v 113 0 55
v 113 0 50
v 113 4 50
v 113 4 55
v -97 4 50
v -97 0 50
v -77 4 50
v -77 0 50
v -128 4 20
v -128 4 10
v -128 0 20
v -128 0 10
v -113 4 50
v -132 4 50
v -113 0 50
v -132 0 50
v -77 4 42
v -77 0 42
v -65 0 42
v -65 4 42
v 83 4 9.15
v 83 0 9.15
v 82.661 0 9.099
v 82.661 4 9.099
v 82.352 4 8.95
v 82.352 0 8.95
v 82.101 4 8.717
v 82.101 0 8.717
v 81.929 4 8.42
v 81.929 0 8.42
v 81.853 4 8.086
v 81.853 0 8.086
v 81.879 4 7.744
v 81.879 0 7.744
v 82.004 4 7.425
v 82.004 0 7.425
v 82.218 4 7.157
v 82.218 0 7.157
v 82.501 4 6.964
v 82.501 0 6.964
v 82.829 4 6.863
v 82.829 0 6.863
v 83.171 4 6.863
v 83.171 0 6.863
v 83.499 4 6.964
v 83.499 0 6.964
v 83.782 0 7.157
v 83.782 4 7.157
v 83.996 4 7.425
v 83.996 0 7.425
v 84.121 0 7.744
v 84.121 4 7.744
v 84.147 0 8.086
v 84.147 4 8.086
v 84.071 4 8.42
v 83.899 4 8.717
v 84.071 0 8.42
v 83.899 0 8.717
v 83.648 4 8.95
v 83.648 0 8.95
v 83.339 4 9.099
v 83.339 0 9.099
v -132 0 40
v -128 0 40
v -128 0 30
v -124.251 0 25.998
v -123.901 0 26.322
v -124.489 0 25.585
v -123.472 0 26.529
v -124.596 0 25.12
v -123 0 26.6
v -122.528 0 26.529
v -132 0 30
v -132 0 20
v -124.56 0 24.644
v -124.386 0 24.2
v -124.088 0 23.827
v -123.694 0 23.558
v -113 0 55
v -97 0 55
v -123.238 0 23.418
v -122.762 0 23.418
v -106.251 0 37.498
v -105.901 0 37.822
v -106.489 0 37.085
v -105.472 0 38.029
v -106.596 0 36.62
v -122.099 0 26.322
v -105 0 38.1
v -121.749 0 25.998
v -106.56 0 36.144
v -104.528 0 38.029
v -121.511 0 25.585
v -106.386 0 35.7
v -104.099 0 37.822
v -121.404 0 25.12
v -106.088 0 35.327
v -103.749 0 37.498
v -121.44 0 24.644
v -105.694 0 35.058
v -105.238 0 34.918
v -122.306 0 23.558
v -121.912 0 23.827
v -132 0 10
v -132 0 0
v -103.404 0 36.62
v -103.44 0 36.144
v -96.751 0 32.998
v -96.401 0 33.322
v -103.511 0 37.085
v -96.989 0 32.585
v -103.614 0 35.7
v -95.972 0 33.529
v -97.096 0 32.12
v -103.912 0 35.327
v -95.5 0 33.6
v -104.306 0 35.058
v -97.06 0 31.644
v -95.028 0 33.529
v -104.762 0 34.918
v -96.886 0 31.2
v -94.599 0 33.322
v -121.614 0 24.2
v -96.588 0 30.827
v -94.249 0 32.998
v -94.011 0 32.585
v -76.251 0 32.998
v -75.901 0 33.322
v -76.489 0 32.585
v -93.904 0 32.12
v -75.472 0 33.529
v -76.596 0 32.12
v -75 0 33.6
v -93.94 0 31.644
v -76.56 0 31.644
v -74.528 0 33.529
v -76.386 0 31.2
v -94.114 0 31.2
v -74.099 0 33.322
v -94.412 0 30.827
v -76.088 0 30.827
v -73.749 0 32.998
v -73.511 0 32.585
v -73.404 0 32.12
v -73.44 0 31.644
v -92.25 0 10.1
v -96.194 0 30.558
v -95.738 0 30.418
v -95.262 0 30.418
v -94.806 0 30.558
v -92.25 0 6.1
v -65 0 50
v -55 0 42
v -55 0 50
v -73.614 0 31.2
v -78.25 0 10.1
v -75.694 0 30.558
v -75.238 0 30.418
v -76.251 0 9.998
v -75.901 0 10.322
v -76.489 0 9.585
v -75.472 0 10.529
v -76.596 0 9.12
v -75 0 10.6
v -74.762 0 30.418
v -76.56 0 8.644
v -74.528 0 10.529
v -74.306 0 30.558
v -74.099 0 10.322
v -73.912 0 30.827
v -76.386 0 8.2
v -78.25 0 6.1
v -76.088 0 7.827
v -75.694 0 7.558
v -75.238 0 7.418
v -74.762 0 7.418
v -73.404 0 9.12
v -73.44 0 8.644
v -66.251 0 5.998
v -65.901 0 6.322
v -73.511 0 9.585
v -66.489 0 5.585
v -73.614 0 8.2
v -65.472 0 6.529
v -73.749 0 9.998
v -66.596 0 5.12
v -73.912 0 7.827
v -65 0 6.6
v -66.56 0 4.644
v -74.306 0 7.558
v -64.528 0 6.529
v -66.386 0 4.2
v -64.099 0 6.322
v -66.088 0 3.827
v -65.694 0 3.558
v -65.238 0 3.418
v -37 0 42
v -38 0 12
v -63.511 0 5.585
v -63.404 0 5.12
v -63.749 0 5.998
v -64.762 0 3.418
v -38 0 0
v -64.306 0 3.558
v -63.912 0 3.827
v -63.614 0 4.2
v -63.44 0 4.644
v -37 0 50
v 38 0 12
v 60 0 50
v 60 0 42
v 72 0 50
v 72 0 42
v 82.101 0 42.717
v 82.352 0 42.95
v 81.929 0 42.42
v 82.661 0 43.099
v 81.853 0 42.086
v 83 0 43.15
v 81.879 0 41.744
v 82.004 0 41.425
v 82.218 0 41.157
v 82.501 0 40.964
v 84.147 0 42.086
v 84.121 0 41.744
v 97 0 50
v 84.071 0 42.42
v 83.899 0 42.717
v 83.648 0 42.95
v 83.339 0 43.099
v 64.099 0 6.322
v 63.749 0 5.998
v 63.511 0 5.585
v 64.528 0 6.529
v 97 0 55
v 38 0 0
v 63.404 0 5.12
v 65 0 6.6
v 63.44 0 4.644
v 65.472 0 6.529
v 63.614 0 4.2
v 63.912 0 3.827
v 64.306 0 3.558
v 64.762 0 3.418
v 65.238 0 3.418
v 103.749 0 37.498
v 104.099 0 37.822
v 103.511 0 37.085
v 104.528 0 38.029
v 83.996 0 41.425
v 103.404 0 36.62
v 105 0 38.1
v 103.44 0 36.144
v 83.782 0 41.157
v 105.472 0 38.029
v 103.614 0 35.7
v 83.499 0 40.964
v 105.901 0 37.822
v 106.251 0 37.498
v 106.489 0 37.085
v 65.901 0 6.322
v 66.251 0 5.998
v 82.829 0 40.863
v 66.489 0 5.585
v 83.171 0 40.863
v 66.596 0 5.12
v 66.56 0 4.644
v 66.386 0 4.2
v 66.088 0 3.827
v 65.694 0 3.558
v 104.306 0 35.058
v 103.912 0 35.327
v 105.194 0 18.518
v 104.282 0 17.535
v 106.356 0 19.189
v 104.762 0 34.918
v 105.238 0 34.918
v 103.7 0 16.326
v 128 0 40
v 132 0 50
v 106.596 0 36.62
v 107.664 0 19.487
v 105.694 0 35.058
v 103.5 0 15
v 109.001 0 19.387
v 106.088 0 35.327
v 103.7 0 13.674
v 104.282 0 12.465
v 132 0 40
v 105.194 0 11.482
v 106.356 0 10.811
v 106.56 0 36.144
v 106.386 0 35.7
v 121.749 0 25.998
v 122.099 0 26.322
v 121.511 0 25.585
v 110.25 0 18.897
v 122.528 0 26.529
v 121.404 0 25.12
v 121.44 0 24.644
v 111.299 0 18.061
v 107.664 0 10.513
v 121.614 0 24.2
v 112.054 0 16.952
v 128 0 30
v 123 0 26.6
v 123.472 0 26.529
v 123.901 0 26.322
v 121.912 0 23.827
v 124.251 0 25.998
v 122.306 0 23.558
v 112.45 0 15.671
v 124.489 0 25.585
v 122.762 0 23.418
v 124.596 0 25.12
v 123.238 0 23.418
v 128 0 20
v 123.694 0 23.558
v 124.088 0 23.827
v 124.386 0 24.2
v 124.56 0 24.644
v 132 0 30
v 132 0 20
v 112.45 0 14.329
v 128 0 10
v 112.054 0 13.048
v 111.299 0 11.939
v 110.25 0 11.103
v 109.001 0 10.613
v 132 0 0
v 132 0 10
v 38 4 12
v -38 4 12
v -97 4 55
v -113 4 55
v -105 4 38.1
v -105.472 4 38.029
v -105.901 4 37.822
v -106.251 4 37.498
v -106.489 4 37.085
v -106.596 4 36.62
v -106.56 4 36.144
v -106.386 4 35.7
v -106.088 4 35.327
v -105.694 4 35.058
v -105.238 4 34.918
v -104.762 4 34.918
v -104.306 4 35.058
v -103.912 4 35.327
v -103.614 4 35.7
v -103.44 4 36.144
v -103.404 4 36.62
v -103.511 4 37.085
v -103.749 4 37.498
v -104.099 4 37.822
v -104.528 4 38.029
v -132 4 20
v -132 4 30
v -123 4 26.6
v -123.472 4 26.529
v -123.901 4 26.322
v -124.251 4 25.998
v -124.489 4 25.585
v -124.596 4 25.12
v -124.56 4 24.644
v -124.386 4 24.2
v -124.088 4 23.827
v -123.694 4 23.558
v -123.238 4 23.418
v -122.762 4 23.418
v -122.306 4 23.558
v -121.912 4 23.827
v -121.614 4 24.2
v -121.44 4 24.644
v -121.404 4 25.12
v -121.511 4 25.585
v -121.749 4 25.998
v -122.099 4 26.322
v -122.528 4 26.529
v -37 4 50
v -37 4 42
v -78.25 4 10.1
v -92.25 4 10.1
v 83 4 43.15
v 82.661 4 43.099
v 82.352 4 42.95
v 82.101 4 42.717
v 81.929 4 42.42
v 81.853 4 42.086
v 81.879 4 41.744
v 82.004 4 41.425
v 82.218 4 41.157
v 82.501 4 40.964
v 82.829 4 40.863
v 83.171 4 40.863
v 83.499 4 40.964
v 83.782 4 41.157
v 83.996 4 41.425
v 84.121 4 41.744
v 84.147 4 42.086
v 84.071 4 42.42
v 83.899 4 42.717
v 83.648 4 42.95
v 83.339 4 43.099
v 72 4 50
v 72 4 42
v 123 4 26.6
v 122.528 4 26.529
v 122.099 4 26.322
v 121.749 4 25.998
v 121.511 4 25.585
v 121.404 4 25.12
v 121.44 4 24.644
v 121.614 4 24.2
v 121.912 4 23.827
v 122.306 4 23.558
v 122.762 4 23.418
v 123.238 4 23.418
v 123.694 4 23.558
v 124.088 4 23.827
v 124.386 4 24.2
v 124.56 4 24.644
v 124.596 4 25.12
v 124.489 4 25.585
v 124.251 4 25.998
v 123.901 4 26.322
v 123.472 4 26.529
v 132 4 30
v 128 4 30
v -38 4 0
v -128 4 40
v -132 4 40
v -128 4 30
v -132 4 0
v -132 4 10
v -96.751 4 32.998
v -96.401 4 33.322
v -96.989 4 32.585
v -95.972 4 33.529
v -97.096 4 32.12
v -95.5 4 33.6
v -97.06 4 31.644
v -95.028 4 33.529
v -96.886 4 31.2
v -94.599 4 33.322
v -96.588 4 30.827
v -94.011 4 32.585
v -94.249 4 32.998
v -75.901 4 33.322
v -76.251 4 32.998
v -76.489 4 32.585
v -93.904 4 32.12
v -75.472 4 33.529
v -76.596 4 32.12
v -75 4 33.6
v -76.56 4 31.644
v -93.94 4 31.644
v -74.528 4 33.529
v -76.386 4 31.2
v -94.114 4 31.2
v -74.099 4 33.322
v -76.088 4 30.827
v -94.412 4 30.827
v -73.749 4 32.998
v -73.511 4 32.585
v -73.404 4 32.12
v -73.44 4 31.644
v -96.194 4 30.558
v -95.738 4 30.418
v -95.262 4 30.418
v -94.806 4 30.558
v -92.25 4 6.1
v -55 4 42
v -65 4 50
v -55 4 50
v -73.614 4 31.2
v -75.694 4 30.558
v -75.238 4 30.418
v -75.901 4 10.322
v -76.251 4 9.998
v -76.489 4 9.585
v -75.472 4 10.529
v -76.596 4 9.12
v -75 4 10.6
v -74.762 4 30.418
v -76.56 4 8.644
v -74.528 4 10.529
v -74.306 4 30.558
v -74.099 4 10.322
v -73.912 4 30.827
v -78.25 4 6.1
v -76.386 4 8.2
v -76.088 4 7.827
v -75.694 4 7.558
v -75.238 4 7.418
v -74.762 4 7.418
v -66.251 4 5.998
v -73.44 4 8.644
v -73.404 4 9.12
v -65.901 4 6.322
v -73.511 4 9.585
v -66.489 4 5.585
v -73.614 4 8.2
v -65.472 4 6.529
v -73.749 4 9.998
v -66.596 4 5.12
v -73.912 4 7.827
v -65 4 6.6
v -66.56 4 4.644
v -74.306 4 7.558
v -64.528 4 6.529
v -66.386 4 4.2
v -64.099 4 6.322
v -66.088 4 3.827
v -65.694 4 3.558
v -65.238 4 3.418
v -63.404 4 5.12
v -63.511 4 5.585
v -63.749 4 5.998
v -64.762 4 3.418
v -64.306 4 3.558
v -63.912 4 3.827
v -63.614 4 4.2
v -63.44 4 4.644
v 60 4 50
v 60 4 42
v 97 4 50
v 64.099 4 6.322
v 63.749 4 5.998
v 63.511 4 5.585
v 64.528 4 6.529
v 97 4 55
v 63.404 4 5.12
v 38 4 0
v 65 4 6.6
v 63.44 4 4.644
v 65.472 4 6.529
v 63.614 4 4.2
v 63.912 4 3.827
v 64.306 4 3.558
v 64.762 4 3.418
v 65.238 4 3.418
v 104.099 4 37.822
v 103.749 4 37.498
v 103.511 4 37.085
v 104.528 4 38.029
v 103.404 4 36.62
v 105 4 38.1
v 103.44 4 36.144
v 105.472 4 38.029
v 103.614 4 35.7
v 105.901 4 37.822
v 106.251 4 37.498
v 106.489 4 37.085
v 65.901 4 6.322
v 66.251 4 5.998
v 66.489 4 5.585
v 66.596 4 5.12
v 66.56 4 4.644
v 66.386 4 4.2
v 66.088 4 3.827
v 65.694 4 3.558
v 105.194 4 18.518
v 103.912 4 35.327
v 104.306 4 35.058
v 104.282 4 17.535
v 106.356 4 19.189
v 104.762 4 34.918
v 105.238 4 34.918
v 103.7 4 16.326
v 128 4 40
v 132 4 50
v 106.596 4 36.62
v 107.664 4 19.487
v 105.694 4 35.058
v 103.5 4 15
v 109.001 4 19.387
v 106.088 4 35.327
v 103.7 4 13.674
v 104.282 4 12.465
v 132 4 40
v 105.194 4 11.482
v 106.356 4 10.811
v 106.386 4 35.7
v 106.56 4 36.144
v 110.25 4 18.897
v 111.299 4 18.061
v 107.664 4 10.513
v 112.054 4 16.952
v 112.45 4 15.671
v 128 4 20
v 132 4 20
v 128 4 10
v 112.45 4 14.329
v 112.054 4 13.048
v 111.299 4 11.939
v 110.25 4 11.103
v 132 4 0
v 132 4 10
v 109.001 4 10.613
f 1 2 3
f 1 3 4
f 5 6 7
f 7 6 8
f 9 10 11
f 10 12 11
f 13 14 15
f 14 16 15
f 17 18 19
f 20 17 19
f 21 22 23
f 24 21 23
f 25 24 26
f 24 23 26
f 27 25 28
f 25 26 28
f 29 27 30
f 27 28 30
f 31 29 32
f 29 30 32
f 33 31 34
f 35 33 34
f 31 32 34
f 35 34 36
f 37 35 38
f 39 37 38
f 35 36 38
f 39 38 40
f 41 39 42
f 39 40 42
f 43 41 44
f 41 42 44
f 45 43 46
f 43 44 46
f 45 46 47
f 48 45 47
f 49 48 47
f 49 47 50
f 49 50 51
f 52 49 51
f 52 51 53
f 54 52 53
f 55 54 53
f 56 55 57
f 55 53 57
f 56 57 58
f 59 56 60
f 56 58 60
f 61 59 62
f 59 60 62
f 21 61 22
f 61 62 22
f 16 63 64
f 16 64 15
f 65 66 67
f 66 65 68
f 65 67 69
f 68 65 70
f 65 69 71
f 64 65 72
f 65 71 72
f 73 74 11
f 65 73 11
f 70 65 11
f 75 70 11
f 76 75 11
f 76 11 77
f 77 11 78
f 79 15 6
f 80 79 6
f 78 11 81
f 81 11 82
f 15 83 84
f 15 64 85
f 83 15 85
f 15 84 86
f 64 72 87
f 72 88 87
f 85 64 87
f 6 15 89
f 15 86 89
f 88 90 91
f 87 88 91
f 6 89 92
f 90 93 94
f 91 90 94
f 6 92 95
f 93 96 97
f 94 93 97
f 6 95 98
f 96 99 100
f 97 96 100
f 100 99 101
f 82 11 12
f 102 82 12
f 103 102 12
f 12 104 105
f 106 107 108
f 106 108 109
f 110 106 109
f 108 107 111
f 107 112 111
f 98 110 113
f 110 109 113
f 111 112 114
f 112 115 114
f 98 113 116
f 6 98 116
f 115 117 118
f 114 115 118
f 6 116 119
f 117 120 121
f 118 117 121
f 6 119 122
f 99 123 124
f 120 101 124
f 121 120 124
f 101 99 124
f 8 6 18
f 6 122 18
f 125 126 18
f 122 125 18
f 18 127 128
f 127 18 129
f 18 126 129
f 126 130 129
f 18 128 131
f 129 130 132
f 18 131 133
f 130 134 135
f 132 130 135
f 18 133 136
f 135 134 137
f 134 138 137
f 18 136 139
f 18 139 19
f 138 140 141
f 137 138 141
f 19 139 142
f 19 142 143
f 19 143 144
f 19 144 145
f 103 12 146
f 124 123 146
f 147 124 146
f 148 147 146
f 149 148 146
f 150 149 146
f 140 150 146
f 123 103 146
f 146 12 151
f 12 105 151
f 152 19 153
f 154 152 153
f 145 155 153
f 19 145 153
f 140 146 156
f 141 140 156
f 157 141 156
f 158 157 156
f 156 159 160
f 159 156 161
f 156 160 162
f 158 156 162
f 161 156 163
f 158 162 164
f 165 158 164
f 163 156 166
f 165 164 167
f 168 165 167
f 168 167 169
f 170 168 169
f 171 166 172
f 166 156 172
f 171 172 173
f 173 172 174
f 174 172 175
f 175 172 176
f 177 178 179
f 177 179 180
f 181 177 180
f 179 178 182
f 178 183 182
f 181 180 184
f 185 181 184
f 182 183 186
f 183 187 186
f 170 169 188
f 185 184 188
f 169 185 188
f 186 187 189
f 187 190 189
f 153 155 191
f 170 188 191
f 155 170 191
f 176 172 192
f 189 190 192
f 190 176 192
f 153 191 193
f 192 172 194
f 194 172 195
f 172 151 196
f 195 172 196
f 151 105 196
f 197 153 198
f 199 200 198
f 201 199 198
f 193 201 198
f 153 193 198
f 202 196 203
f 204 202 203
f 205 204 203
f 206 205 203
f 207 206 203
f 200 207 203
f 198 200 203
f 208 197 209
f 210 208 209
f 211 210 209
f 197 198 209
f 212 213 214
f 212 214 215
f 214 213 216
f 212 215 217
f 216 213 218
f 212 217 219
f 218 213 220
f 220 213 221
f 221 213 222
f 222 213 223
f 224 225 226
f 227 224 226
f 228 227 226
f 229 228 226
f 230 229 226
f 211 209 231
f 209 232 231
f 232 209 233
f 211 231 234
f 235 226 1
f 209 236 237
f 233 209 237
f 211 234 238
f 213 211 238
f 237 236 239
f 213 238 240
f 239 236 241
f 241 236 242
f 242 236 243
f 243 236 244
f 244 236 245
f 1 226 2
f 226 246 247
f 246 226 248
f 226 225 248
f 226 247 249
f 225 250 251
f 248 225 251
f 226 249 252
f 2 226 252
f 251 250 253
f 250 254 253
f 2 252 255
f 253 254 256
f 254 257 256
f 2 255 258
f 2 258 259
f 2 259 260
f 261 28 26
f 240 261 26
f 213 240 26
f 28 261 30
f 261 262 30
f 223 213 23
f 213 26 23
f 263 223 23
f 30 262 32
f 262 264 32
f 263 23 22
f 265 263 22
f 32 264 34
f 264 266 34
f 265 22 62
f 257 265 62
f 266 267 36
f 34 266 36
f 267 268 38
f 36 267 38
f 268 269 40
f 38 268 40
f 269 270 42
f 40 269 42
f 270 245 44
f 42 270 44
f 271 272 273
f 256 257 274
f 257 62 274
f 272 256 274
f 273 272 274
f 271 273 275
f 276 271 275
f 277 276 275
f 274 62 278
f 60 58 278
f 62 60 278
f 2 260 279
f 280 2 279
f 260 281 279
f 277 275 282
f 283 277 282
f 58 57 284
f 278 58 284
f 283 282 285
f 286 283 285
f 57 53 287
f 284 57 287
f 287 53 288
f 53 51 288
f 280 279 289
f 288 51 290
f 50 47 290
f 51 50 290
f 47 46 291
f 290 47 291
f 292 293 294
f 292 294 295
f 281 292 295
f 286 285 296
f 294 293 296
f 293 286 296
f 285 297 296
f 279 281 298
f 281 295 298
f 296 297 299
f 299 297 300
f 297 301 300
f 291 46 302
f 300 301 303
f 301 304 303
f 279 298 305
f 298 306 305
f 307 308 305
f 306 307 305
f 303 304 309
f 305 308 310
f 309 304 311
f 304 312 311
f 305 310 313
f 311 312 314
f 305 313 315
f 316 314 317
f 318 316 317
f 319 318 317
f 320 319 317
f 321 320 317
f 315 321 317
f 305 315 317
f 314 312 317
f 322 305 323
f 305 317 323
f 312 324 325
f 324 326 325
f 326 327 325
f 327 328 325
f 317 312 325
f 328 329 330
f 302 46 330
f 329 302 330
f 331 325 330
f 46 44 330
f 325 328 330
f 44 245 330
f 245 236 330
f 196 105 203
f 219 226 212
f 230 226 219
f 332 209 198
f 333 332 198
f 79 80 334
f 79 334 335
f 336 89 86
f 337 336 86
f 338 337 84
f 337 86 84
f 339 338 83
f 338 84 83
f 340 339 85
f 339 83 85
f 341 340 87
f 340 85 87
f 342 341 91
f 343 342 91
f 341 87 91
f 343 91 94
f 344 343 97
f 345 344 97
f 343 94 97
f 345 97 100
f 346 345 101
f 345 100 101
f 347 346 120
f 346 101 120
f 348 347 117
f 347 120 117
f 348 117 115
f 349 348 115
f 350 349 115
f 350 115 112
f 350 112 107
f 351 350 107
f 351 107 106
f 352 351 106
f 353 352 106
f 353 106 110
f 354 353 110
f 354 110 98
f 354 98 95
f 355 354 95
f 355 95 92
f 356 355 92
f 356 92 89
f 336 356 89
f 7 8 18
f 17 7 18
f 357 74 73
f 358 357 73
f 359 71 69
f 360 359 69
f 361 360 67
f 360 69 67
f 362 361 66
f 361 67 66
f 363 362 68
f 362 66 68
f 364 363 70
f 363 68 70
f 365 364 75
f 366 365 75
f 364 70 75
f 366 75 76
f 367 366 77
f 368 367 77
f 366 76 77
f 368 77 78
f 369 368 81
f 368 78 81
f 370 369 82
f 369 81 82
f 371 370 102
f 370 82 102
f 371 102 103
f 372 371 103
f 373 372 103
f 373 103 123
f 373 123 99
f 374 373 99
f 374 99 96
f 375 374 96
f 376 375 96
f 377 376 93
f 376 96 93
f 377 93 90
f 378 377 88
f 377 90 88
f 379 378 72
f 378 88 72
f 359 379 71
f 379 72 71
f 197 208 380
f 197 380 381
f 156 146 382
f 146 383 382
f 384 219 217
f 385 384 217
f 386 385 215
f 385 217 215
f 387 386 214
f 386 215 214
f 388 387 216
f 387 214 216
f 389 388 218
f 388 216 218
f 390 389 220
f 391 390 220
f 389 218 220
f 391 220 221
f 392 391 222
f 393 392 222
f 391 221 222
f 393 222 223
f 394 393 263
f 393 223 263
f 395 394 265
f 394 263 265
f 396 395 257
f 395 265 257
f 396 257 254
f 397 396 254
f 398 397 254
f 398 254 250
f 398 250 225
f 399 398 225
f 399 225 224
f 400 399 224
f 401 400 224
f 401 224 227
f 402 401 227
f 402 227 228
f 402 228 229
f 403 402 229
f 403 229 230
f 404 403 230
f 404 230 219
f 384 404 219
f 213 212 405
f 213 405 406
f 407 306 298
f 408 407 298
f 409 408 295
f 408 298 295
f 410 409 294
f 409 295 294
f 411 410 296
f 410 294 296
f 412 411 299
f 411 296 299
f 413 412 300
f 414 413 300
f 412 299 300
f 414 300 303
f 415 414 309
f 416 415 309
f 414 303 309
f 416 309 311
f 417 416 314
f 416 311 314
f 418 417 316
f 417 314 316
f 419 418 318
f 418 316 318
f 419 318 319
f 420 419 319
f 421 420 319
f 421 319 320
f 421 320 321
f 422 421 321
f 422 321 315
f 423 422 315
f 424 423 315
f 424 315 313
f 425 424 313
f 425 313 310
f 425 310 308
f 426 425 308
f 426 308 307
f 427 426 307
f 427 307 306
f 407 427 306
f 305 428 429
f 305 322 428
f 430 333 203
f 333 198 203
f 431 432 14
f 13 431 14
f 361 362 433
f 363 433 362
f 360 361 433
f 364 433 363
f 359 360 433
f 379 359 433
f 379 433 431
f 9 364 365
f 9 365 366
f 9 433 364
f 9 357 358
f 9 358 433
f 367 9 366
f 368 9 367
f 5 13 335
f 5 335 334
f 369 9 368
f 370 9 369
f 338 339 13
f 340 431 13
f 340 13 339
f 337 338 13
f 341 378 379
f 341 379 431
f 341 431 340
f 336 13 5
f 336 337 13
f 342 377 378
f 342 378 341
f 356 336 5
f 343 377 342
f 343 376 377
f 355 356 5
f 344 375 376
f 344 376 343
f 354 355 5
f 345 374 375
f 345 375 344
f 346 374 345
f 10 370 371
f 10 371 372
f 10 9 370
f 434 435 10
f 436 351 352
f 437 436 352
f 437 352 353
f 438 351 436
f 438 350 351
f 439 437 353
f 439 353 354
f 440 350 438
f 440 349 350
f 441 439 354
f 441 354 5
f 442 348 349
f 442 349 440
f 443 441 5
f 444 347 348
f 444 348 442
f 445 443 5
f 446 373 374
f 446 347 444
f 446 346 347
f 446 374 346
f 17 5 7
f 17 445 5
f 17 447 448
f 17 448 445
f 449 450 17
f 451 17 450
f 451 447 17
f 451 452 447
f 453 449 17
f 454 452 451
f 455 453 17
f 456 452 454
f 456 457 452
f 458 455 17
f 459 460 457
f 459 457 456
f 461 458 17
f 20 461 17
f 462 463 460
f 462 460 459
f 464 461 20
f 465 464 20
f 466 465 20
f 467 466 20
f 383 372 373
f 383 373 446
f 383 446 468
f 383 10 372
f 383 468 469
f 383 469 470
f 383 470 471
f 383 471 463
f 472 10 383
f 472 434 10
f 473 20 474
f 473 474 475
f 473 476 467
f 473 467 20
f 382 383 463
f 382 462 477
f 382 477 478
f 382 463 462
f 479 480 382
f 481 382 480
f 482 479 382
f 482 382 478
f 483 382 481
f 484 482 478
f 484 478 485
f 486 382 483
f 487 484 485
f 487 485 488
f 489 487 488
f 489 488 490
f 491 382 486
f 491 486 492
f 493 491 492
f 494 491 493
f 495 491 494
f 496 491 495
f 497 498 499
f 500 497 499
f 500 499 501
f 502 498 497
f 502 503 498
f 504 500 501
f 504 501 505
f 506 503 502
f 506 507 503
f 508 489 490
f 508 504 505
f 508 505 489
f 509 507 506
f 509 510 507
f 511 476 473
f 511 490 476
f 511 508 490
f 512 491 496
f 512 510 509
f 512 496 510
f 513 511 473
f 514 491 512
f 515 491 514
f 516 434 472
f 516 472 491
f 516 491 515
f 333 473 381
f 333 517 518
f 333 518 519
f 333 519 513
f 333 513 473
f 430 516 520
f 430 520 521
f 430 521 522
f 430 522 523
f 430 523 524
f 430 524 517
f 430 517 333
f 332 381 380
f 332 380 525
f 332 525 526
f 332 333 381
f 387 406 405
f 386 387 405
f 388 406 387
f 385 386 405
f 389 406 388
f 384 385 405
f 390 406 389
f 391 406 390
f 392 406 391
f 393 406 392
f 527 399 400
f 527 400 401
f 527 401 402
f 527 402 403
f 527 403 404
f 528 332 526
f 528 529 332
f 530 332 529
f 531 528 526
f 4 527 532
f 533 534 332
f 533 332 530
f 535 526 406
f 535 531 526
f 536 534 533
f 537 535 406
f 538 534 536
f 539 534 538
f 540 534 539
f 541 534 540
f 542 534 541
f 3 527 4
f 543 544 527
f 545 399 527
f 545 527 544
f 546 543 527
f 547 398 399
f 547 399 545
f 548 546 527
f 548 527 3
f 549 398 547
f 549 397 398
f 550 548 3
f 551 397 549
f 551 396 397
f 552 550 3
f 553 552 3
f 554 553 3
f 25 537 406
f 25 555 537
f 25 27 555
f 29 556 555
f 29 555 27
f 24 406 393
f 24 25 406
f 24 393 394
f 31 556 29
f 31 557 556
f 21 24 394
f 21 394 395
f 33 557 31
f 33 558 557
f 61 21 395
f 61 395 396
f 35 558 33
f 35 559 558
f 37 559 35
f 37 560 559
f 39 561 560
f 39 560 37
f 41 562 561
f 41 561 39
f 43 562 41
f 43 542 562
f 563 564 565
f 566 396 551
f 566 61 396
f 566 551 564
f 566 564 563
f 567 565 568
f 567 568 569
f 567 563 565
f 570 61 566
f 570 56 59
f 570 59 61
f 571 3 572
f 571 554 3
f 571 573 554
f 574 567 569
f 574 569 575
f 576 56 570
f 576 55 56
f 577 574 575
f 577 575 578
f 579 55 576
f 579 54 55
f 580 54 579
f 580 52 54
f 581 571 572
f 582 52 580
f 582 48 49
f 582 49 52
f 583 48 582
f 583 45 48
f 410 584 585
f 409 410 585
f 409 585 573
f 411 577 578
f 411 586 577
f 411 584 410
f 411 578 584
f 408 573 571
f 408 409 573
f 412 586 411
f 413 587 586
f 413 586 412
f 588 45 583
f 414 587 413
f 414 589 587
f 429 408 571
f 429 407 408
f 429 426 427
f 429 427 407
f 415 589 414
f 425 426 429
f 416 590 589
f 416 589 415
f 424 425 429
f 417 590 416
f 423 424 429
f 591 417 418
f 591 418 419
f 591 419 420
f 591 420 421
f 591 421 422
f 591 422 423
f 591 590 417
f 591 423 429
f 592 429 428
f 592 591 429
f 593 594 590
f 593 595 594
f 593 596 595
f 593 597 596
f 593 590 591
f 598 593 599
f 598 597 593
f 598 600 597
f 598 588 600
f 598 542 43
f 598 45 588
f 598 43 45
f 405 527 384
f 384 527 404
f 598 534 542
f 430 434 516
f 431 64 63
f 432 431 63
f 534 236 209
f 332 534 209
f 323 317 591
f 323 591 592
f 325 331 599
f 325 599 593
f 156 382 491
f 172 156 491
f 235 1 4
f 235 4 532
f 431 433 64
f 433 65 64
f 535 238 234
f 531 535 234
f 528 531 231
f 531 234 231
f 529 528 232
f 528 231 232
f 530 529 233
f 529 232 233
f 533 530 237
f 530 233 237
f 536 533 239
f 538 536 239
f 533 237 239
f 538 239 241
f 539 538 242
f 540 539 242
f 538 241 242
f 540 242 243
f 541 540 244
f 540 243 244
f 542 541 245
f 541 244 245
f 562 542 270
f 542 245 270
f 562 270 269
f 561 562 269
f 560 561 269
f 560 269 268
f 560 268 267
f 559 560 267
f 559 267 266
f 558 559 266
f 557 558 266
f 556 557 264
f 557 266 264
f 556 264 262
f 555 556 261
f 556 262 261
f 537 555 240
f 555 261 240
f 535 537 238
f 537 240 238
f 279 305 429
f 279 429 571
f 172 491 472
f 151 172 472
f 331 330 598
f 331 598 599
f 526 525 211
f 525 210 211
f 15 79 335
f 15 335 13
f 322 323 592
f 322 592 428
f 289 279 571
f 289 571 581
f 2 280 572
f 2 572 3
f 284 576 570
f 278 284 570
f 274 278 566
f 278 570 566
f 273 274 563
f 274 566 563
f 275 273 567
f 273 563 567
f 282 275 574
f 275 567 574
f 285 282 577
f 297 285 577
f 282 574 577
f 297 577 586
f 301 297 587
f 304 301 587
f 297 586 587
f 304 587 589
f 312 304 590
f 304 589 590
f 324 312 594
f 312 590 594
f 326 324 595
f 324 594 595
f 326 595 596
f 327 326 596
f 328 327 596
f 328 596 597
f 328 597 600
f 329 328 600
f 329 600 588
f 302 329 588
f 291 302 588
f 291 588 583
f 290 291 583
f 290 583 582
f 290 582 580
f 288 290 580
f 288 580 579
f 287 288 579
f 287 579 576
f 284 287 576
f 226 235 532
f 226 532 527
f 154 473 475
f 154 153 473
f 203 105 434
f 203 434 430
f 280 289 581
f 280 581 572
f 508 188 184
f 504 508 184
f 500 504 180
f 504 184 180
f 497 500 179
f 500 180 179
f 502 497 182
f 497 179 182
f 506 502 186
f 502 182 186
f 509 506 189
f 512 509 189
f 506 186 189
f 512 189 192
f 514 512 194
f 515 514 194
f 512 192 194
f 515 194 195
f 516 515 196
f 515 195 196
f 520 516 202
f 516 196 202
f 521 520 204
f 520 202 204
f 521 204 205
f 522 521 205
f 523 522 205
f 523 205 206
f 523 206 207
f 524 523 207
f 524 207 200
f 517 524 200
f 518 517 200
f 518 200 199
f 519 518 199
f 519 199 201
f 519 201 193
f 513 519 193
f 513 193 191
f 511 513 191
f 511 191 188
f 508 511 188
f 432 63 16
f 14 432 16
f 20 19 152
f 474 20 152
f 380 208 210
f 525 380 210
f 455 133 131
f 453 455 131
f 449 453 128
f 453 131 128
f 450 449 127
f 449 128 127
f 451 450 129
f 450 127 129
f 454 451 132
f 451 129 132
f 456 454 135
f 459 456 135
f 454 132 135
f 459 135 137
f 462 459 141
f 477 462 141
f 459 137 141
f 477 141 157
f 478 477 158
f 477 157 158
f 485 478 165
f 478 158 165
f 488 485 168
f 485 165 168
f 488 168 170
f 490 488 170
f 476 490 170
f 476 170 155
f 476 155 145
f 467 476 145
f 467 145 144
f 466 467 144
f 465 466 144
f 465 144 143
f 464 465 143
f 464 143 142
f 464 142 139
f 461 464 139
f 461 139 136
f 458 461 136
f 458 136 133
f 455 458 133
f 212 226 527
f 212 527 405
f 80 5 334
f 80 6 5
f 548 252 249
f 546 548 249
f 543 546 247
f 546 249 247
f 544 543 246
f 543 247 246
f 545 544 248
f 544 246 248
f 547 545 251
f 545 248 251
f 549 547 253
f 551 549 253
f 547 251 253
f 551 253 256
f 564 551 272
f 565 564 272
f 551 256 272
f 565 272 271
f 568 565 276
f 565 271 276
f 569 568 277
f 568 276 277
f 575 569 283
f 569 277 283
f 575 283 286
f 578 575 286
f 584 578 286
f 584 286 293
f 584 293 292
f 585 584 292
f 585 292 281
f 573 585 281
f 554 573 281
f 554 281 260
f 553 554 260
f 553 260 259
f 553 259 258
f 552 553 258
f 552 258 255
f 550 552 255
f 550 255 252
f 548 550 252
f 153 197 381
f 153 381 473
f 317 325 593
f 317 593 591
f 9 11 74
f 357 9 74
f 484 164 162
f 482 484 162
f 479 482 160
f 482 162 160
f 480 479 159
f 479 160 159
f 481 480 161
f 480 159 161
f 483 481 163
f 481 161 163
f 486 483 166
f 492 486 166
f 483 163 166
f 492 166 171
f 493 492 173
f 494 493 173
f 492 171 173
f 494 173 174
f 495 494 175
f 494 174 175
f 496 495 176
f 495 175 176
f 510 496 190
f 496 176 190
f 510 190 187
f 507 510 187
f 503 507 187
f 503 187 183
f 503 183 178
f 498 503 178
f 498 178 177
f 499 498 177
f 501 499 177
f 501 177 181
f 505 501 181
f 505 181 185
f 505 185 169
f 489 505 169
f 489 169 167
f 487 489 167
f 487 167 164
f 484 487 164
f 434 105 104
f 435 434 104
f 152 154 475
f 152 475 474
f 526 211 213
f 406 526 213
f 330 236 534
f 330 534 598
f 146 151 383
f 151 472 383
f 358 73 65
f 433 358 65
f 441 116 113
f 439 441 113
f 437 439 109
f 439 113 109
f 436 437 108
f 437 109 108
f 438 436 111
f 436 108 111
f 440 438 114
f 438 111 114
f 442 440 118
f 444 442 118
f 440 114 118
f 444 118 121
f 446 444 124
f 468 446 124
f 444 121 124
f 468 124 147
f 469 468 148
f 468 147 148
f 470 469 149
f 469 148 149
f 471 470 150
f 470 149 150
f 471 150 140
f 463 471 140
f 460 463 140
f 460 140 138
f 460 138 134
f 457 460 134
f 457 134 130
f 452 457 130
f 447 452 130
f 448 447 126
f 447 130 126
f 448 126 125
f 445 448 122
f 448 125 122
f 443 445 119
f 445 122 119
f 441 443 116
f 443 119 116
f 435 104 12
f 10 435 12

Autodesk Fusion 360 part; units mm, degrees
sketch "スケッチ1" plane through (0, 0, 0) normal (0, 1, 0) x (1, 0, 0)
  line L0 (-132, 0) -> (132, 0)
  line L1 (-132, 0) -> (-132, -10)
  line L2 (-132, -10) -> (-128, -10)
  line L3 (-128, -10) -> (-128, -20)
  line L4 (-128, -20) -> (-132, -20)
  line L5 (-132, -20) -> (-132, -30)
  line L6 (-132, -30) -> (-128, -30)
  line L7 (-128, -30) -> (-128, -40)
  line L8 (-128, -40) -> (-132, -40)
  line L9 (-132, -40) -> (-132, -50)
  line L10 (-132, -50) -> (-77, -50)
  line L11 (-77, -50) -> (-77, -42)
  line L12 (132, 0) -> (132, -10)
  line L13 (132, -10) -> (128, -10)
  line L14 (128, -10) -> (128, -20)
  line L15 (128, -20) -> (132, -20)
  line L16 (132, -20) -> (132, -30)
  line L17 (132, -30) -> (128, -30)
  line L18 (128, -30) -> (128, -40)
  line L19 (128, -40) -> (132, -40)
  line L20 (132, -40) -> (132, -50)
  line L21 (132, -50) -> (72, -50)
  line L22 (72, -50) -> (72, -42)
  line L23 (-77, -42) -> (-65, -42)
  line L24 (-65, -42) -> (-65, -50)
  line L25 (-37, -50) -> (60, -50)
  line L26 (60, -50) -> (60, -42)
  line L27 (60, -42) -> (72, -42)
  line L28 (-113, -50) -> (-97, -50)
  line L29 (-97, -50) -> (-97, -55)
  line L30 (-97, -55) -> (-113, -55)
  line L31 (-113, -55) -> (-113, -50)
  line L32 (97, -50) -> (113, -50)
  line L33 (113, -50) -> (113, -55)
  line L34 (113, -55) -> (97, -55)
  line L35 (97, -55) -> (97, -50)
  line L36 (-38, 0) -> (38, 0)
  line L37 (38, 0) -> (38, -12)
  line L38 (38, -12) -> (-38, -12)
  line L39 (-38, -12) -> (-38, 0)
  line L40 (-37, -50) -> (-37, -42)
  line L41 (-37, -42) -> (-55, -42)
  line L42 (-55, -42) -> (-55, -50)
  line L43 (-55, -50) -> (-65, -50)
  point P0 (0, -20)
  point P1 (-105, -50)
  point P2 (105, -50)
  dimension "d1" = 264
  dimension "d2" = 10
  dimension "d3" = 10
  dimension "d4" = 10
  dimension "d5" = 10
  dimension "d6" = 10
  dimension "d7" = 4
  dimension "d8" = 55
  dimension "d9" = 4
  dimension "d10" = 60
  dimension "d11" = 8
  dimension "d28" = 12
  dimension "d40" = 16
  dimension "d41" = 5
  dimension "d42" = 105
  dimension "d43" = 105
  dimension "d48" = 12
  dimension "d62" = 12
  dimension "d63" = 76
  dimension "d64" = 10
  dimension "d65" = 18
extrude "押し出し1" add sketch "スケッチ1" along normal blind 4 contours L0 L1 L2 L3 L4 L5 L6 L7 L8 L9 L10 L11 L12 L13 L14 L15 L16 L17 L18 L19 L20 L21 L22 L23 L24 L25 L26 L27 L28 L32 L37 L38 L39 L40 L41 L42 L43 | L10 L28 L29 L30 L31 | L21 L32 L33 L34 L35
sketch "スケッチ2" plane through (0, 4, 0) normal (0, 1, 0) x (-1, 0, 0)
  line L0 (-72, 42) -> (-72, 50)
  line L1 (-72, 50) -> (-97, 50)
  line L2 (-132, 50) -> (-132, 40)
  line L3 (-132, 40) -> (-128, 40)
  line L4 (-128, 40) -> (-128, 30)
  line L5 (-128, 30) -> (-132, 30)
  line L6 (-132, 30) -> (-132, 20)
  line L7 (-132, 20) -> (-128, 20)
  line L8 (-128, 20) -> (-128, 10)
  line L9 (-128, 10) -> (-132, 10)
  line L10 (-132, 10) -> (-132, 0)
  line L11 (38, 0) -> (132, 0)
  line L12 (65, 5) -> (-65, 5)
  line L13 (123, 25) -> (-123, 25)
  line L14 (105, 36.5) -> (-105, 36.5)
  line L15 (37, 50) -> (-60, 50)
  line L16 (-60, 50) -> (-60, 42)
  line L17 (-60, 42) -> (-72, 42)
  line L18 (132, 0) -> (132, 10)
  line L19 (132, 10) -> (128, 10)
  line L20 (128, 10) -> (128, 20)
  line L21 (128, 20) -> (132, 20)
  line L22 (132, 20) -> (132, 30)
  line L23 (132, 30) -> (128, 30)
  line L24 (128, 30) -> (128, 40)
  line L25 (128, 40) -> (132, 40)
  line L26 (132, 40) -> (132, 50)
  line L27 (132, 50) -> (113, 50)
  line L28 (77, 50) -> (77, 42)
  line L29 (77, 42) -> (65, 42)
  line L30 (65, 42) -> (65, 50)
  line L31 (113, 50) -> (113, 55)
  line L32 (113, 55) -> (97, 55)
  line L33 (97, 55) -> (97, 50)
  line L34 (97, 50) -> (77, 50)
  line L35 (-97, 50) -> (-97, 55)
  line L36 (-97, 55) -> (-113, 55)
  line L37 (-113, 55) -> (-113, 50)
  line L38 (-113, 50) -> (-132, 50)
  line L39 (-38, 0) -> (-38, 12)
  line L40 (-38, 12) -> (38, 12)
  line L41 (38, 12) -> (38, 0)
  line L42 (-132, 0) -> (-38, 0)
  line L43 (65, 50) -> (55, 50)
  line L44 (55, 50) -> (55, 42)
  line L45 (55, 42) -> (37, 42)
  line L46 (37, 42) -> (37, 50)
  dimension "d14" = 5
  dimension "d15" = 65
  dimension "d16" = 65
  dimension "d17" = 25
  dimension "d19" = 5
  dimension "d24" = 105
  dimension "d25" = 105
  dimension "d46" = 13.5
  dimension "d47" = 5
hole "穴1" at (-65, 4, 5) at (-123, 4, 25) at (65, 4, 5) at (123, 4, 25) at (-105, 4, 36.5) at (105, 4, 36.5) direction (0, -1, 0) diameter 3.2 end through all
sketch "スケッチ3" plane through (0, 4, 0) normal (0, 1, 0) x (-1, 0, 0)
  circle A0 centre (-65, 5) radius 1.6
  circle A1 centre (123, 25) radius 1.6
  circle A2 centre (-123, 25) radius 1.6
  circle A3 centre (-105, 36.5) radius 1.6
  line L0 (132, 0) -> (132, 10)
  line L1 (132, 10) -> (128, 10)
  line L2 (128, 10) -> (128, 20)
  line L3 (128, 20) -> (132, 20)
  line L4 (132, 20) -> (132, 30)
  line L5 (132, 30) -> (128, 30)
  line L6 (128, 30) -> (128, 40)
  line L7 (128, 40) -> (132, 40)
  line L8 (132, 40) -> (132, 50)
  line L9 (132, 50) -> (113, 50)
  line L10 (77, 50) -> (77, 42)
  line L11 (77, 42) -> (65, 42)
  line L12 (65, 42) -> (65, 50)
  line L13 (37, 50) -> (-60, 50)
  line L14 (-60, 50) -> (-60, 42)
  line L15 (-60, 42) -> (-72, 42)
  line L16 (-72, 42) -> (-72, 50)
  line L17 (-72, 50) -> (-97, 50)
  line L18 (-132, 50) -> (-132, 40)
  line L19 (-132, 40) -> (-128, 40)
  line L20 (-128, 40) -> (-128, 30)
  line L21 (-128, 30) -> (-132, 30)
  line L22 (-132, 30) -> (-132, 20)
  line L23 (-132, 20) -> (-128, 20)
  line L24 (-128, 20) -> (-128, 10)
  line L25 (-128, 10) -> (-132, 10)
  line L26 (-132, 10) -> (-132, 0)
  line L27 (38, 0) -> (132, 0)
  circle A4 centre (-108, 15) radius 4.5
  circle A5 centre (-83, 25) radius 15
  line L28 (-83, 8) -> (-83, 42)
  line L29 (113, 50) -> (113, 55)
  line L30 (113, 55) -> (97, 55)
  line L31 (97, 55) -> (97, 50)
  line L32 (97, 50) -> (77, 50)
  line L33 (-97, 50) -> (-97, 55)
  line L34 (-97, 55) -> (-113, 55)
  line L35 (-113, 55) -> (-113, 50)
  line L36 (-113, 50) -> (-132, 50)
  line L37 (75, 9) -> (95.5, 9)
  line L38 (95.5, 9) -> (95.5, 32)
  line L39 (95.5, 32) -> (75, 32)
  line L40 (75, 32) -> (75, 9)
  line L41 (75, 9) -> (95.5, 32) construction
  line L42 (95.5, 9) -> (75, 32) construction
  line L43 (78.25, 6.1) -> (92.25, 6.1)
  line L44 (92.25, 6.1) -> (92.25, 10.1)
  line L45 (92.25, 10.1) -> (78.25, 10.1)
  line L46 (78.25, 10.1) -> (78.25, 6.1)
  line L47 (78.25, 6.1) -> (92.25, 10.1) construction
  line L48 (92.25, 6.1) -> (78.25, 10.1) construction
  line L49 (-38, 0) -> (-38, 12)
  line L50 (-38, 12) -> (38, 12)
  line L51 (38, 12) -> (38, 0)
  line L52 (-132, 0) -> (-38, 0)
  line L53 (65, 50) -> (55, 50)
  line L54 (55, 50) -> (55, 42)
  line L55 (55, 42) -> (37, 42)
  line L56 (37, 42) -> (37, 50)
  point P0 (85.25, 20.5)
  point P1 (85.25, 8.1)
  dimension "d29" = 34
  dimension "d30" = 30
  dimension "d31" = 9
  dimension "d32" = 15
  dimension "d33" = 20
  dimension "d34" = 25
  dimension "d35" = 45
  dimension "d51" = 23
  dimension "d52" = 20.5
  dimension "d53" = 4
  dimension "d54" = 14
  dimension "d55" = 12.4
  dimension "d56" = 75
  dimension "d57" = 9
extrude "押し出し2" cut sketch "スケッチ3" against normal through all contours A4
hole "穴2" at (83, 4, 42) at (83, 4, 8) direction (0, -1, 0) diameter 2.3 depth 35 tip angle 118
extrude "押し出し3" cut sketch "スケッチ3" against normal through all contours L37 L44 L45 L46 | L37 L43 L44 L46
hole "穴3" at (0, 0, 0) at (-75, 4, 9) at (-75, 4, 32) at (-95.5, 4, 32) direction (0, -1, 0) diameter 3.2 depth 16 tip angle 118
